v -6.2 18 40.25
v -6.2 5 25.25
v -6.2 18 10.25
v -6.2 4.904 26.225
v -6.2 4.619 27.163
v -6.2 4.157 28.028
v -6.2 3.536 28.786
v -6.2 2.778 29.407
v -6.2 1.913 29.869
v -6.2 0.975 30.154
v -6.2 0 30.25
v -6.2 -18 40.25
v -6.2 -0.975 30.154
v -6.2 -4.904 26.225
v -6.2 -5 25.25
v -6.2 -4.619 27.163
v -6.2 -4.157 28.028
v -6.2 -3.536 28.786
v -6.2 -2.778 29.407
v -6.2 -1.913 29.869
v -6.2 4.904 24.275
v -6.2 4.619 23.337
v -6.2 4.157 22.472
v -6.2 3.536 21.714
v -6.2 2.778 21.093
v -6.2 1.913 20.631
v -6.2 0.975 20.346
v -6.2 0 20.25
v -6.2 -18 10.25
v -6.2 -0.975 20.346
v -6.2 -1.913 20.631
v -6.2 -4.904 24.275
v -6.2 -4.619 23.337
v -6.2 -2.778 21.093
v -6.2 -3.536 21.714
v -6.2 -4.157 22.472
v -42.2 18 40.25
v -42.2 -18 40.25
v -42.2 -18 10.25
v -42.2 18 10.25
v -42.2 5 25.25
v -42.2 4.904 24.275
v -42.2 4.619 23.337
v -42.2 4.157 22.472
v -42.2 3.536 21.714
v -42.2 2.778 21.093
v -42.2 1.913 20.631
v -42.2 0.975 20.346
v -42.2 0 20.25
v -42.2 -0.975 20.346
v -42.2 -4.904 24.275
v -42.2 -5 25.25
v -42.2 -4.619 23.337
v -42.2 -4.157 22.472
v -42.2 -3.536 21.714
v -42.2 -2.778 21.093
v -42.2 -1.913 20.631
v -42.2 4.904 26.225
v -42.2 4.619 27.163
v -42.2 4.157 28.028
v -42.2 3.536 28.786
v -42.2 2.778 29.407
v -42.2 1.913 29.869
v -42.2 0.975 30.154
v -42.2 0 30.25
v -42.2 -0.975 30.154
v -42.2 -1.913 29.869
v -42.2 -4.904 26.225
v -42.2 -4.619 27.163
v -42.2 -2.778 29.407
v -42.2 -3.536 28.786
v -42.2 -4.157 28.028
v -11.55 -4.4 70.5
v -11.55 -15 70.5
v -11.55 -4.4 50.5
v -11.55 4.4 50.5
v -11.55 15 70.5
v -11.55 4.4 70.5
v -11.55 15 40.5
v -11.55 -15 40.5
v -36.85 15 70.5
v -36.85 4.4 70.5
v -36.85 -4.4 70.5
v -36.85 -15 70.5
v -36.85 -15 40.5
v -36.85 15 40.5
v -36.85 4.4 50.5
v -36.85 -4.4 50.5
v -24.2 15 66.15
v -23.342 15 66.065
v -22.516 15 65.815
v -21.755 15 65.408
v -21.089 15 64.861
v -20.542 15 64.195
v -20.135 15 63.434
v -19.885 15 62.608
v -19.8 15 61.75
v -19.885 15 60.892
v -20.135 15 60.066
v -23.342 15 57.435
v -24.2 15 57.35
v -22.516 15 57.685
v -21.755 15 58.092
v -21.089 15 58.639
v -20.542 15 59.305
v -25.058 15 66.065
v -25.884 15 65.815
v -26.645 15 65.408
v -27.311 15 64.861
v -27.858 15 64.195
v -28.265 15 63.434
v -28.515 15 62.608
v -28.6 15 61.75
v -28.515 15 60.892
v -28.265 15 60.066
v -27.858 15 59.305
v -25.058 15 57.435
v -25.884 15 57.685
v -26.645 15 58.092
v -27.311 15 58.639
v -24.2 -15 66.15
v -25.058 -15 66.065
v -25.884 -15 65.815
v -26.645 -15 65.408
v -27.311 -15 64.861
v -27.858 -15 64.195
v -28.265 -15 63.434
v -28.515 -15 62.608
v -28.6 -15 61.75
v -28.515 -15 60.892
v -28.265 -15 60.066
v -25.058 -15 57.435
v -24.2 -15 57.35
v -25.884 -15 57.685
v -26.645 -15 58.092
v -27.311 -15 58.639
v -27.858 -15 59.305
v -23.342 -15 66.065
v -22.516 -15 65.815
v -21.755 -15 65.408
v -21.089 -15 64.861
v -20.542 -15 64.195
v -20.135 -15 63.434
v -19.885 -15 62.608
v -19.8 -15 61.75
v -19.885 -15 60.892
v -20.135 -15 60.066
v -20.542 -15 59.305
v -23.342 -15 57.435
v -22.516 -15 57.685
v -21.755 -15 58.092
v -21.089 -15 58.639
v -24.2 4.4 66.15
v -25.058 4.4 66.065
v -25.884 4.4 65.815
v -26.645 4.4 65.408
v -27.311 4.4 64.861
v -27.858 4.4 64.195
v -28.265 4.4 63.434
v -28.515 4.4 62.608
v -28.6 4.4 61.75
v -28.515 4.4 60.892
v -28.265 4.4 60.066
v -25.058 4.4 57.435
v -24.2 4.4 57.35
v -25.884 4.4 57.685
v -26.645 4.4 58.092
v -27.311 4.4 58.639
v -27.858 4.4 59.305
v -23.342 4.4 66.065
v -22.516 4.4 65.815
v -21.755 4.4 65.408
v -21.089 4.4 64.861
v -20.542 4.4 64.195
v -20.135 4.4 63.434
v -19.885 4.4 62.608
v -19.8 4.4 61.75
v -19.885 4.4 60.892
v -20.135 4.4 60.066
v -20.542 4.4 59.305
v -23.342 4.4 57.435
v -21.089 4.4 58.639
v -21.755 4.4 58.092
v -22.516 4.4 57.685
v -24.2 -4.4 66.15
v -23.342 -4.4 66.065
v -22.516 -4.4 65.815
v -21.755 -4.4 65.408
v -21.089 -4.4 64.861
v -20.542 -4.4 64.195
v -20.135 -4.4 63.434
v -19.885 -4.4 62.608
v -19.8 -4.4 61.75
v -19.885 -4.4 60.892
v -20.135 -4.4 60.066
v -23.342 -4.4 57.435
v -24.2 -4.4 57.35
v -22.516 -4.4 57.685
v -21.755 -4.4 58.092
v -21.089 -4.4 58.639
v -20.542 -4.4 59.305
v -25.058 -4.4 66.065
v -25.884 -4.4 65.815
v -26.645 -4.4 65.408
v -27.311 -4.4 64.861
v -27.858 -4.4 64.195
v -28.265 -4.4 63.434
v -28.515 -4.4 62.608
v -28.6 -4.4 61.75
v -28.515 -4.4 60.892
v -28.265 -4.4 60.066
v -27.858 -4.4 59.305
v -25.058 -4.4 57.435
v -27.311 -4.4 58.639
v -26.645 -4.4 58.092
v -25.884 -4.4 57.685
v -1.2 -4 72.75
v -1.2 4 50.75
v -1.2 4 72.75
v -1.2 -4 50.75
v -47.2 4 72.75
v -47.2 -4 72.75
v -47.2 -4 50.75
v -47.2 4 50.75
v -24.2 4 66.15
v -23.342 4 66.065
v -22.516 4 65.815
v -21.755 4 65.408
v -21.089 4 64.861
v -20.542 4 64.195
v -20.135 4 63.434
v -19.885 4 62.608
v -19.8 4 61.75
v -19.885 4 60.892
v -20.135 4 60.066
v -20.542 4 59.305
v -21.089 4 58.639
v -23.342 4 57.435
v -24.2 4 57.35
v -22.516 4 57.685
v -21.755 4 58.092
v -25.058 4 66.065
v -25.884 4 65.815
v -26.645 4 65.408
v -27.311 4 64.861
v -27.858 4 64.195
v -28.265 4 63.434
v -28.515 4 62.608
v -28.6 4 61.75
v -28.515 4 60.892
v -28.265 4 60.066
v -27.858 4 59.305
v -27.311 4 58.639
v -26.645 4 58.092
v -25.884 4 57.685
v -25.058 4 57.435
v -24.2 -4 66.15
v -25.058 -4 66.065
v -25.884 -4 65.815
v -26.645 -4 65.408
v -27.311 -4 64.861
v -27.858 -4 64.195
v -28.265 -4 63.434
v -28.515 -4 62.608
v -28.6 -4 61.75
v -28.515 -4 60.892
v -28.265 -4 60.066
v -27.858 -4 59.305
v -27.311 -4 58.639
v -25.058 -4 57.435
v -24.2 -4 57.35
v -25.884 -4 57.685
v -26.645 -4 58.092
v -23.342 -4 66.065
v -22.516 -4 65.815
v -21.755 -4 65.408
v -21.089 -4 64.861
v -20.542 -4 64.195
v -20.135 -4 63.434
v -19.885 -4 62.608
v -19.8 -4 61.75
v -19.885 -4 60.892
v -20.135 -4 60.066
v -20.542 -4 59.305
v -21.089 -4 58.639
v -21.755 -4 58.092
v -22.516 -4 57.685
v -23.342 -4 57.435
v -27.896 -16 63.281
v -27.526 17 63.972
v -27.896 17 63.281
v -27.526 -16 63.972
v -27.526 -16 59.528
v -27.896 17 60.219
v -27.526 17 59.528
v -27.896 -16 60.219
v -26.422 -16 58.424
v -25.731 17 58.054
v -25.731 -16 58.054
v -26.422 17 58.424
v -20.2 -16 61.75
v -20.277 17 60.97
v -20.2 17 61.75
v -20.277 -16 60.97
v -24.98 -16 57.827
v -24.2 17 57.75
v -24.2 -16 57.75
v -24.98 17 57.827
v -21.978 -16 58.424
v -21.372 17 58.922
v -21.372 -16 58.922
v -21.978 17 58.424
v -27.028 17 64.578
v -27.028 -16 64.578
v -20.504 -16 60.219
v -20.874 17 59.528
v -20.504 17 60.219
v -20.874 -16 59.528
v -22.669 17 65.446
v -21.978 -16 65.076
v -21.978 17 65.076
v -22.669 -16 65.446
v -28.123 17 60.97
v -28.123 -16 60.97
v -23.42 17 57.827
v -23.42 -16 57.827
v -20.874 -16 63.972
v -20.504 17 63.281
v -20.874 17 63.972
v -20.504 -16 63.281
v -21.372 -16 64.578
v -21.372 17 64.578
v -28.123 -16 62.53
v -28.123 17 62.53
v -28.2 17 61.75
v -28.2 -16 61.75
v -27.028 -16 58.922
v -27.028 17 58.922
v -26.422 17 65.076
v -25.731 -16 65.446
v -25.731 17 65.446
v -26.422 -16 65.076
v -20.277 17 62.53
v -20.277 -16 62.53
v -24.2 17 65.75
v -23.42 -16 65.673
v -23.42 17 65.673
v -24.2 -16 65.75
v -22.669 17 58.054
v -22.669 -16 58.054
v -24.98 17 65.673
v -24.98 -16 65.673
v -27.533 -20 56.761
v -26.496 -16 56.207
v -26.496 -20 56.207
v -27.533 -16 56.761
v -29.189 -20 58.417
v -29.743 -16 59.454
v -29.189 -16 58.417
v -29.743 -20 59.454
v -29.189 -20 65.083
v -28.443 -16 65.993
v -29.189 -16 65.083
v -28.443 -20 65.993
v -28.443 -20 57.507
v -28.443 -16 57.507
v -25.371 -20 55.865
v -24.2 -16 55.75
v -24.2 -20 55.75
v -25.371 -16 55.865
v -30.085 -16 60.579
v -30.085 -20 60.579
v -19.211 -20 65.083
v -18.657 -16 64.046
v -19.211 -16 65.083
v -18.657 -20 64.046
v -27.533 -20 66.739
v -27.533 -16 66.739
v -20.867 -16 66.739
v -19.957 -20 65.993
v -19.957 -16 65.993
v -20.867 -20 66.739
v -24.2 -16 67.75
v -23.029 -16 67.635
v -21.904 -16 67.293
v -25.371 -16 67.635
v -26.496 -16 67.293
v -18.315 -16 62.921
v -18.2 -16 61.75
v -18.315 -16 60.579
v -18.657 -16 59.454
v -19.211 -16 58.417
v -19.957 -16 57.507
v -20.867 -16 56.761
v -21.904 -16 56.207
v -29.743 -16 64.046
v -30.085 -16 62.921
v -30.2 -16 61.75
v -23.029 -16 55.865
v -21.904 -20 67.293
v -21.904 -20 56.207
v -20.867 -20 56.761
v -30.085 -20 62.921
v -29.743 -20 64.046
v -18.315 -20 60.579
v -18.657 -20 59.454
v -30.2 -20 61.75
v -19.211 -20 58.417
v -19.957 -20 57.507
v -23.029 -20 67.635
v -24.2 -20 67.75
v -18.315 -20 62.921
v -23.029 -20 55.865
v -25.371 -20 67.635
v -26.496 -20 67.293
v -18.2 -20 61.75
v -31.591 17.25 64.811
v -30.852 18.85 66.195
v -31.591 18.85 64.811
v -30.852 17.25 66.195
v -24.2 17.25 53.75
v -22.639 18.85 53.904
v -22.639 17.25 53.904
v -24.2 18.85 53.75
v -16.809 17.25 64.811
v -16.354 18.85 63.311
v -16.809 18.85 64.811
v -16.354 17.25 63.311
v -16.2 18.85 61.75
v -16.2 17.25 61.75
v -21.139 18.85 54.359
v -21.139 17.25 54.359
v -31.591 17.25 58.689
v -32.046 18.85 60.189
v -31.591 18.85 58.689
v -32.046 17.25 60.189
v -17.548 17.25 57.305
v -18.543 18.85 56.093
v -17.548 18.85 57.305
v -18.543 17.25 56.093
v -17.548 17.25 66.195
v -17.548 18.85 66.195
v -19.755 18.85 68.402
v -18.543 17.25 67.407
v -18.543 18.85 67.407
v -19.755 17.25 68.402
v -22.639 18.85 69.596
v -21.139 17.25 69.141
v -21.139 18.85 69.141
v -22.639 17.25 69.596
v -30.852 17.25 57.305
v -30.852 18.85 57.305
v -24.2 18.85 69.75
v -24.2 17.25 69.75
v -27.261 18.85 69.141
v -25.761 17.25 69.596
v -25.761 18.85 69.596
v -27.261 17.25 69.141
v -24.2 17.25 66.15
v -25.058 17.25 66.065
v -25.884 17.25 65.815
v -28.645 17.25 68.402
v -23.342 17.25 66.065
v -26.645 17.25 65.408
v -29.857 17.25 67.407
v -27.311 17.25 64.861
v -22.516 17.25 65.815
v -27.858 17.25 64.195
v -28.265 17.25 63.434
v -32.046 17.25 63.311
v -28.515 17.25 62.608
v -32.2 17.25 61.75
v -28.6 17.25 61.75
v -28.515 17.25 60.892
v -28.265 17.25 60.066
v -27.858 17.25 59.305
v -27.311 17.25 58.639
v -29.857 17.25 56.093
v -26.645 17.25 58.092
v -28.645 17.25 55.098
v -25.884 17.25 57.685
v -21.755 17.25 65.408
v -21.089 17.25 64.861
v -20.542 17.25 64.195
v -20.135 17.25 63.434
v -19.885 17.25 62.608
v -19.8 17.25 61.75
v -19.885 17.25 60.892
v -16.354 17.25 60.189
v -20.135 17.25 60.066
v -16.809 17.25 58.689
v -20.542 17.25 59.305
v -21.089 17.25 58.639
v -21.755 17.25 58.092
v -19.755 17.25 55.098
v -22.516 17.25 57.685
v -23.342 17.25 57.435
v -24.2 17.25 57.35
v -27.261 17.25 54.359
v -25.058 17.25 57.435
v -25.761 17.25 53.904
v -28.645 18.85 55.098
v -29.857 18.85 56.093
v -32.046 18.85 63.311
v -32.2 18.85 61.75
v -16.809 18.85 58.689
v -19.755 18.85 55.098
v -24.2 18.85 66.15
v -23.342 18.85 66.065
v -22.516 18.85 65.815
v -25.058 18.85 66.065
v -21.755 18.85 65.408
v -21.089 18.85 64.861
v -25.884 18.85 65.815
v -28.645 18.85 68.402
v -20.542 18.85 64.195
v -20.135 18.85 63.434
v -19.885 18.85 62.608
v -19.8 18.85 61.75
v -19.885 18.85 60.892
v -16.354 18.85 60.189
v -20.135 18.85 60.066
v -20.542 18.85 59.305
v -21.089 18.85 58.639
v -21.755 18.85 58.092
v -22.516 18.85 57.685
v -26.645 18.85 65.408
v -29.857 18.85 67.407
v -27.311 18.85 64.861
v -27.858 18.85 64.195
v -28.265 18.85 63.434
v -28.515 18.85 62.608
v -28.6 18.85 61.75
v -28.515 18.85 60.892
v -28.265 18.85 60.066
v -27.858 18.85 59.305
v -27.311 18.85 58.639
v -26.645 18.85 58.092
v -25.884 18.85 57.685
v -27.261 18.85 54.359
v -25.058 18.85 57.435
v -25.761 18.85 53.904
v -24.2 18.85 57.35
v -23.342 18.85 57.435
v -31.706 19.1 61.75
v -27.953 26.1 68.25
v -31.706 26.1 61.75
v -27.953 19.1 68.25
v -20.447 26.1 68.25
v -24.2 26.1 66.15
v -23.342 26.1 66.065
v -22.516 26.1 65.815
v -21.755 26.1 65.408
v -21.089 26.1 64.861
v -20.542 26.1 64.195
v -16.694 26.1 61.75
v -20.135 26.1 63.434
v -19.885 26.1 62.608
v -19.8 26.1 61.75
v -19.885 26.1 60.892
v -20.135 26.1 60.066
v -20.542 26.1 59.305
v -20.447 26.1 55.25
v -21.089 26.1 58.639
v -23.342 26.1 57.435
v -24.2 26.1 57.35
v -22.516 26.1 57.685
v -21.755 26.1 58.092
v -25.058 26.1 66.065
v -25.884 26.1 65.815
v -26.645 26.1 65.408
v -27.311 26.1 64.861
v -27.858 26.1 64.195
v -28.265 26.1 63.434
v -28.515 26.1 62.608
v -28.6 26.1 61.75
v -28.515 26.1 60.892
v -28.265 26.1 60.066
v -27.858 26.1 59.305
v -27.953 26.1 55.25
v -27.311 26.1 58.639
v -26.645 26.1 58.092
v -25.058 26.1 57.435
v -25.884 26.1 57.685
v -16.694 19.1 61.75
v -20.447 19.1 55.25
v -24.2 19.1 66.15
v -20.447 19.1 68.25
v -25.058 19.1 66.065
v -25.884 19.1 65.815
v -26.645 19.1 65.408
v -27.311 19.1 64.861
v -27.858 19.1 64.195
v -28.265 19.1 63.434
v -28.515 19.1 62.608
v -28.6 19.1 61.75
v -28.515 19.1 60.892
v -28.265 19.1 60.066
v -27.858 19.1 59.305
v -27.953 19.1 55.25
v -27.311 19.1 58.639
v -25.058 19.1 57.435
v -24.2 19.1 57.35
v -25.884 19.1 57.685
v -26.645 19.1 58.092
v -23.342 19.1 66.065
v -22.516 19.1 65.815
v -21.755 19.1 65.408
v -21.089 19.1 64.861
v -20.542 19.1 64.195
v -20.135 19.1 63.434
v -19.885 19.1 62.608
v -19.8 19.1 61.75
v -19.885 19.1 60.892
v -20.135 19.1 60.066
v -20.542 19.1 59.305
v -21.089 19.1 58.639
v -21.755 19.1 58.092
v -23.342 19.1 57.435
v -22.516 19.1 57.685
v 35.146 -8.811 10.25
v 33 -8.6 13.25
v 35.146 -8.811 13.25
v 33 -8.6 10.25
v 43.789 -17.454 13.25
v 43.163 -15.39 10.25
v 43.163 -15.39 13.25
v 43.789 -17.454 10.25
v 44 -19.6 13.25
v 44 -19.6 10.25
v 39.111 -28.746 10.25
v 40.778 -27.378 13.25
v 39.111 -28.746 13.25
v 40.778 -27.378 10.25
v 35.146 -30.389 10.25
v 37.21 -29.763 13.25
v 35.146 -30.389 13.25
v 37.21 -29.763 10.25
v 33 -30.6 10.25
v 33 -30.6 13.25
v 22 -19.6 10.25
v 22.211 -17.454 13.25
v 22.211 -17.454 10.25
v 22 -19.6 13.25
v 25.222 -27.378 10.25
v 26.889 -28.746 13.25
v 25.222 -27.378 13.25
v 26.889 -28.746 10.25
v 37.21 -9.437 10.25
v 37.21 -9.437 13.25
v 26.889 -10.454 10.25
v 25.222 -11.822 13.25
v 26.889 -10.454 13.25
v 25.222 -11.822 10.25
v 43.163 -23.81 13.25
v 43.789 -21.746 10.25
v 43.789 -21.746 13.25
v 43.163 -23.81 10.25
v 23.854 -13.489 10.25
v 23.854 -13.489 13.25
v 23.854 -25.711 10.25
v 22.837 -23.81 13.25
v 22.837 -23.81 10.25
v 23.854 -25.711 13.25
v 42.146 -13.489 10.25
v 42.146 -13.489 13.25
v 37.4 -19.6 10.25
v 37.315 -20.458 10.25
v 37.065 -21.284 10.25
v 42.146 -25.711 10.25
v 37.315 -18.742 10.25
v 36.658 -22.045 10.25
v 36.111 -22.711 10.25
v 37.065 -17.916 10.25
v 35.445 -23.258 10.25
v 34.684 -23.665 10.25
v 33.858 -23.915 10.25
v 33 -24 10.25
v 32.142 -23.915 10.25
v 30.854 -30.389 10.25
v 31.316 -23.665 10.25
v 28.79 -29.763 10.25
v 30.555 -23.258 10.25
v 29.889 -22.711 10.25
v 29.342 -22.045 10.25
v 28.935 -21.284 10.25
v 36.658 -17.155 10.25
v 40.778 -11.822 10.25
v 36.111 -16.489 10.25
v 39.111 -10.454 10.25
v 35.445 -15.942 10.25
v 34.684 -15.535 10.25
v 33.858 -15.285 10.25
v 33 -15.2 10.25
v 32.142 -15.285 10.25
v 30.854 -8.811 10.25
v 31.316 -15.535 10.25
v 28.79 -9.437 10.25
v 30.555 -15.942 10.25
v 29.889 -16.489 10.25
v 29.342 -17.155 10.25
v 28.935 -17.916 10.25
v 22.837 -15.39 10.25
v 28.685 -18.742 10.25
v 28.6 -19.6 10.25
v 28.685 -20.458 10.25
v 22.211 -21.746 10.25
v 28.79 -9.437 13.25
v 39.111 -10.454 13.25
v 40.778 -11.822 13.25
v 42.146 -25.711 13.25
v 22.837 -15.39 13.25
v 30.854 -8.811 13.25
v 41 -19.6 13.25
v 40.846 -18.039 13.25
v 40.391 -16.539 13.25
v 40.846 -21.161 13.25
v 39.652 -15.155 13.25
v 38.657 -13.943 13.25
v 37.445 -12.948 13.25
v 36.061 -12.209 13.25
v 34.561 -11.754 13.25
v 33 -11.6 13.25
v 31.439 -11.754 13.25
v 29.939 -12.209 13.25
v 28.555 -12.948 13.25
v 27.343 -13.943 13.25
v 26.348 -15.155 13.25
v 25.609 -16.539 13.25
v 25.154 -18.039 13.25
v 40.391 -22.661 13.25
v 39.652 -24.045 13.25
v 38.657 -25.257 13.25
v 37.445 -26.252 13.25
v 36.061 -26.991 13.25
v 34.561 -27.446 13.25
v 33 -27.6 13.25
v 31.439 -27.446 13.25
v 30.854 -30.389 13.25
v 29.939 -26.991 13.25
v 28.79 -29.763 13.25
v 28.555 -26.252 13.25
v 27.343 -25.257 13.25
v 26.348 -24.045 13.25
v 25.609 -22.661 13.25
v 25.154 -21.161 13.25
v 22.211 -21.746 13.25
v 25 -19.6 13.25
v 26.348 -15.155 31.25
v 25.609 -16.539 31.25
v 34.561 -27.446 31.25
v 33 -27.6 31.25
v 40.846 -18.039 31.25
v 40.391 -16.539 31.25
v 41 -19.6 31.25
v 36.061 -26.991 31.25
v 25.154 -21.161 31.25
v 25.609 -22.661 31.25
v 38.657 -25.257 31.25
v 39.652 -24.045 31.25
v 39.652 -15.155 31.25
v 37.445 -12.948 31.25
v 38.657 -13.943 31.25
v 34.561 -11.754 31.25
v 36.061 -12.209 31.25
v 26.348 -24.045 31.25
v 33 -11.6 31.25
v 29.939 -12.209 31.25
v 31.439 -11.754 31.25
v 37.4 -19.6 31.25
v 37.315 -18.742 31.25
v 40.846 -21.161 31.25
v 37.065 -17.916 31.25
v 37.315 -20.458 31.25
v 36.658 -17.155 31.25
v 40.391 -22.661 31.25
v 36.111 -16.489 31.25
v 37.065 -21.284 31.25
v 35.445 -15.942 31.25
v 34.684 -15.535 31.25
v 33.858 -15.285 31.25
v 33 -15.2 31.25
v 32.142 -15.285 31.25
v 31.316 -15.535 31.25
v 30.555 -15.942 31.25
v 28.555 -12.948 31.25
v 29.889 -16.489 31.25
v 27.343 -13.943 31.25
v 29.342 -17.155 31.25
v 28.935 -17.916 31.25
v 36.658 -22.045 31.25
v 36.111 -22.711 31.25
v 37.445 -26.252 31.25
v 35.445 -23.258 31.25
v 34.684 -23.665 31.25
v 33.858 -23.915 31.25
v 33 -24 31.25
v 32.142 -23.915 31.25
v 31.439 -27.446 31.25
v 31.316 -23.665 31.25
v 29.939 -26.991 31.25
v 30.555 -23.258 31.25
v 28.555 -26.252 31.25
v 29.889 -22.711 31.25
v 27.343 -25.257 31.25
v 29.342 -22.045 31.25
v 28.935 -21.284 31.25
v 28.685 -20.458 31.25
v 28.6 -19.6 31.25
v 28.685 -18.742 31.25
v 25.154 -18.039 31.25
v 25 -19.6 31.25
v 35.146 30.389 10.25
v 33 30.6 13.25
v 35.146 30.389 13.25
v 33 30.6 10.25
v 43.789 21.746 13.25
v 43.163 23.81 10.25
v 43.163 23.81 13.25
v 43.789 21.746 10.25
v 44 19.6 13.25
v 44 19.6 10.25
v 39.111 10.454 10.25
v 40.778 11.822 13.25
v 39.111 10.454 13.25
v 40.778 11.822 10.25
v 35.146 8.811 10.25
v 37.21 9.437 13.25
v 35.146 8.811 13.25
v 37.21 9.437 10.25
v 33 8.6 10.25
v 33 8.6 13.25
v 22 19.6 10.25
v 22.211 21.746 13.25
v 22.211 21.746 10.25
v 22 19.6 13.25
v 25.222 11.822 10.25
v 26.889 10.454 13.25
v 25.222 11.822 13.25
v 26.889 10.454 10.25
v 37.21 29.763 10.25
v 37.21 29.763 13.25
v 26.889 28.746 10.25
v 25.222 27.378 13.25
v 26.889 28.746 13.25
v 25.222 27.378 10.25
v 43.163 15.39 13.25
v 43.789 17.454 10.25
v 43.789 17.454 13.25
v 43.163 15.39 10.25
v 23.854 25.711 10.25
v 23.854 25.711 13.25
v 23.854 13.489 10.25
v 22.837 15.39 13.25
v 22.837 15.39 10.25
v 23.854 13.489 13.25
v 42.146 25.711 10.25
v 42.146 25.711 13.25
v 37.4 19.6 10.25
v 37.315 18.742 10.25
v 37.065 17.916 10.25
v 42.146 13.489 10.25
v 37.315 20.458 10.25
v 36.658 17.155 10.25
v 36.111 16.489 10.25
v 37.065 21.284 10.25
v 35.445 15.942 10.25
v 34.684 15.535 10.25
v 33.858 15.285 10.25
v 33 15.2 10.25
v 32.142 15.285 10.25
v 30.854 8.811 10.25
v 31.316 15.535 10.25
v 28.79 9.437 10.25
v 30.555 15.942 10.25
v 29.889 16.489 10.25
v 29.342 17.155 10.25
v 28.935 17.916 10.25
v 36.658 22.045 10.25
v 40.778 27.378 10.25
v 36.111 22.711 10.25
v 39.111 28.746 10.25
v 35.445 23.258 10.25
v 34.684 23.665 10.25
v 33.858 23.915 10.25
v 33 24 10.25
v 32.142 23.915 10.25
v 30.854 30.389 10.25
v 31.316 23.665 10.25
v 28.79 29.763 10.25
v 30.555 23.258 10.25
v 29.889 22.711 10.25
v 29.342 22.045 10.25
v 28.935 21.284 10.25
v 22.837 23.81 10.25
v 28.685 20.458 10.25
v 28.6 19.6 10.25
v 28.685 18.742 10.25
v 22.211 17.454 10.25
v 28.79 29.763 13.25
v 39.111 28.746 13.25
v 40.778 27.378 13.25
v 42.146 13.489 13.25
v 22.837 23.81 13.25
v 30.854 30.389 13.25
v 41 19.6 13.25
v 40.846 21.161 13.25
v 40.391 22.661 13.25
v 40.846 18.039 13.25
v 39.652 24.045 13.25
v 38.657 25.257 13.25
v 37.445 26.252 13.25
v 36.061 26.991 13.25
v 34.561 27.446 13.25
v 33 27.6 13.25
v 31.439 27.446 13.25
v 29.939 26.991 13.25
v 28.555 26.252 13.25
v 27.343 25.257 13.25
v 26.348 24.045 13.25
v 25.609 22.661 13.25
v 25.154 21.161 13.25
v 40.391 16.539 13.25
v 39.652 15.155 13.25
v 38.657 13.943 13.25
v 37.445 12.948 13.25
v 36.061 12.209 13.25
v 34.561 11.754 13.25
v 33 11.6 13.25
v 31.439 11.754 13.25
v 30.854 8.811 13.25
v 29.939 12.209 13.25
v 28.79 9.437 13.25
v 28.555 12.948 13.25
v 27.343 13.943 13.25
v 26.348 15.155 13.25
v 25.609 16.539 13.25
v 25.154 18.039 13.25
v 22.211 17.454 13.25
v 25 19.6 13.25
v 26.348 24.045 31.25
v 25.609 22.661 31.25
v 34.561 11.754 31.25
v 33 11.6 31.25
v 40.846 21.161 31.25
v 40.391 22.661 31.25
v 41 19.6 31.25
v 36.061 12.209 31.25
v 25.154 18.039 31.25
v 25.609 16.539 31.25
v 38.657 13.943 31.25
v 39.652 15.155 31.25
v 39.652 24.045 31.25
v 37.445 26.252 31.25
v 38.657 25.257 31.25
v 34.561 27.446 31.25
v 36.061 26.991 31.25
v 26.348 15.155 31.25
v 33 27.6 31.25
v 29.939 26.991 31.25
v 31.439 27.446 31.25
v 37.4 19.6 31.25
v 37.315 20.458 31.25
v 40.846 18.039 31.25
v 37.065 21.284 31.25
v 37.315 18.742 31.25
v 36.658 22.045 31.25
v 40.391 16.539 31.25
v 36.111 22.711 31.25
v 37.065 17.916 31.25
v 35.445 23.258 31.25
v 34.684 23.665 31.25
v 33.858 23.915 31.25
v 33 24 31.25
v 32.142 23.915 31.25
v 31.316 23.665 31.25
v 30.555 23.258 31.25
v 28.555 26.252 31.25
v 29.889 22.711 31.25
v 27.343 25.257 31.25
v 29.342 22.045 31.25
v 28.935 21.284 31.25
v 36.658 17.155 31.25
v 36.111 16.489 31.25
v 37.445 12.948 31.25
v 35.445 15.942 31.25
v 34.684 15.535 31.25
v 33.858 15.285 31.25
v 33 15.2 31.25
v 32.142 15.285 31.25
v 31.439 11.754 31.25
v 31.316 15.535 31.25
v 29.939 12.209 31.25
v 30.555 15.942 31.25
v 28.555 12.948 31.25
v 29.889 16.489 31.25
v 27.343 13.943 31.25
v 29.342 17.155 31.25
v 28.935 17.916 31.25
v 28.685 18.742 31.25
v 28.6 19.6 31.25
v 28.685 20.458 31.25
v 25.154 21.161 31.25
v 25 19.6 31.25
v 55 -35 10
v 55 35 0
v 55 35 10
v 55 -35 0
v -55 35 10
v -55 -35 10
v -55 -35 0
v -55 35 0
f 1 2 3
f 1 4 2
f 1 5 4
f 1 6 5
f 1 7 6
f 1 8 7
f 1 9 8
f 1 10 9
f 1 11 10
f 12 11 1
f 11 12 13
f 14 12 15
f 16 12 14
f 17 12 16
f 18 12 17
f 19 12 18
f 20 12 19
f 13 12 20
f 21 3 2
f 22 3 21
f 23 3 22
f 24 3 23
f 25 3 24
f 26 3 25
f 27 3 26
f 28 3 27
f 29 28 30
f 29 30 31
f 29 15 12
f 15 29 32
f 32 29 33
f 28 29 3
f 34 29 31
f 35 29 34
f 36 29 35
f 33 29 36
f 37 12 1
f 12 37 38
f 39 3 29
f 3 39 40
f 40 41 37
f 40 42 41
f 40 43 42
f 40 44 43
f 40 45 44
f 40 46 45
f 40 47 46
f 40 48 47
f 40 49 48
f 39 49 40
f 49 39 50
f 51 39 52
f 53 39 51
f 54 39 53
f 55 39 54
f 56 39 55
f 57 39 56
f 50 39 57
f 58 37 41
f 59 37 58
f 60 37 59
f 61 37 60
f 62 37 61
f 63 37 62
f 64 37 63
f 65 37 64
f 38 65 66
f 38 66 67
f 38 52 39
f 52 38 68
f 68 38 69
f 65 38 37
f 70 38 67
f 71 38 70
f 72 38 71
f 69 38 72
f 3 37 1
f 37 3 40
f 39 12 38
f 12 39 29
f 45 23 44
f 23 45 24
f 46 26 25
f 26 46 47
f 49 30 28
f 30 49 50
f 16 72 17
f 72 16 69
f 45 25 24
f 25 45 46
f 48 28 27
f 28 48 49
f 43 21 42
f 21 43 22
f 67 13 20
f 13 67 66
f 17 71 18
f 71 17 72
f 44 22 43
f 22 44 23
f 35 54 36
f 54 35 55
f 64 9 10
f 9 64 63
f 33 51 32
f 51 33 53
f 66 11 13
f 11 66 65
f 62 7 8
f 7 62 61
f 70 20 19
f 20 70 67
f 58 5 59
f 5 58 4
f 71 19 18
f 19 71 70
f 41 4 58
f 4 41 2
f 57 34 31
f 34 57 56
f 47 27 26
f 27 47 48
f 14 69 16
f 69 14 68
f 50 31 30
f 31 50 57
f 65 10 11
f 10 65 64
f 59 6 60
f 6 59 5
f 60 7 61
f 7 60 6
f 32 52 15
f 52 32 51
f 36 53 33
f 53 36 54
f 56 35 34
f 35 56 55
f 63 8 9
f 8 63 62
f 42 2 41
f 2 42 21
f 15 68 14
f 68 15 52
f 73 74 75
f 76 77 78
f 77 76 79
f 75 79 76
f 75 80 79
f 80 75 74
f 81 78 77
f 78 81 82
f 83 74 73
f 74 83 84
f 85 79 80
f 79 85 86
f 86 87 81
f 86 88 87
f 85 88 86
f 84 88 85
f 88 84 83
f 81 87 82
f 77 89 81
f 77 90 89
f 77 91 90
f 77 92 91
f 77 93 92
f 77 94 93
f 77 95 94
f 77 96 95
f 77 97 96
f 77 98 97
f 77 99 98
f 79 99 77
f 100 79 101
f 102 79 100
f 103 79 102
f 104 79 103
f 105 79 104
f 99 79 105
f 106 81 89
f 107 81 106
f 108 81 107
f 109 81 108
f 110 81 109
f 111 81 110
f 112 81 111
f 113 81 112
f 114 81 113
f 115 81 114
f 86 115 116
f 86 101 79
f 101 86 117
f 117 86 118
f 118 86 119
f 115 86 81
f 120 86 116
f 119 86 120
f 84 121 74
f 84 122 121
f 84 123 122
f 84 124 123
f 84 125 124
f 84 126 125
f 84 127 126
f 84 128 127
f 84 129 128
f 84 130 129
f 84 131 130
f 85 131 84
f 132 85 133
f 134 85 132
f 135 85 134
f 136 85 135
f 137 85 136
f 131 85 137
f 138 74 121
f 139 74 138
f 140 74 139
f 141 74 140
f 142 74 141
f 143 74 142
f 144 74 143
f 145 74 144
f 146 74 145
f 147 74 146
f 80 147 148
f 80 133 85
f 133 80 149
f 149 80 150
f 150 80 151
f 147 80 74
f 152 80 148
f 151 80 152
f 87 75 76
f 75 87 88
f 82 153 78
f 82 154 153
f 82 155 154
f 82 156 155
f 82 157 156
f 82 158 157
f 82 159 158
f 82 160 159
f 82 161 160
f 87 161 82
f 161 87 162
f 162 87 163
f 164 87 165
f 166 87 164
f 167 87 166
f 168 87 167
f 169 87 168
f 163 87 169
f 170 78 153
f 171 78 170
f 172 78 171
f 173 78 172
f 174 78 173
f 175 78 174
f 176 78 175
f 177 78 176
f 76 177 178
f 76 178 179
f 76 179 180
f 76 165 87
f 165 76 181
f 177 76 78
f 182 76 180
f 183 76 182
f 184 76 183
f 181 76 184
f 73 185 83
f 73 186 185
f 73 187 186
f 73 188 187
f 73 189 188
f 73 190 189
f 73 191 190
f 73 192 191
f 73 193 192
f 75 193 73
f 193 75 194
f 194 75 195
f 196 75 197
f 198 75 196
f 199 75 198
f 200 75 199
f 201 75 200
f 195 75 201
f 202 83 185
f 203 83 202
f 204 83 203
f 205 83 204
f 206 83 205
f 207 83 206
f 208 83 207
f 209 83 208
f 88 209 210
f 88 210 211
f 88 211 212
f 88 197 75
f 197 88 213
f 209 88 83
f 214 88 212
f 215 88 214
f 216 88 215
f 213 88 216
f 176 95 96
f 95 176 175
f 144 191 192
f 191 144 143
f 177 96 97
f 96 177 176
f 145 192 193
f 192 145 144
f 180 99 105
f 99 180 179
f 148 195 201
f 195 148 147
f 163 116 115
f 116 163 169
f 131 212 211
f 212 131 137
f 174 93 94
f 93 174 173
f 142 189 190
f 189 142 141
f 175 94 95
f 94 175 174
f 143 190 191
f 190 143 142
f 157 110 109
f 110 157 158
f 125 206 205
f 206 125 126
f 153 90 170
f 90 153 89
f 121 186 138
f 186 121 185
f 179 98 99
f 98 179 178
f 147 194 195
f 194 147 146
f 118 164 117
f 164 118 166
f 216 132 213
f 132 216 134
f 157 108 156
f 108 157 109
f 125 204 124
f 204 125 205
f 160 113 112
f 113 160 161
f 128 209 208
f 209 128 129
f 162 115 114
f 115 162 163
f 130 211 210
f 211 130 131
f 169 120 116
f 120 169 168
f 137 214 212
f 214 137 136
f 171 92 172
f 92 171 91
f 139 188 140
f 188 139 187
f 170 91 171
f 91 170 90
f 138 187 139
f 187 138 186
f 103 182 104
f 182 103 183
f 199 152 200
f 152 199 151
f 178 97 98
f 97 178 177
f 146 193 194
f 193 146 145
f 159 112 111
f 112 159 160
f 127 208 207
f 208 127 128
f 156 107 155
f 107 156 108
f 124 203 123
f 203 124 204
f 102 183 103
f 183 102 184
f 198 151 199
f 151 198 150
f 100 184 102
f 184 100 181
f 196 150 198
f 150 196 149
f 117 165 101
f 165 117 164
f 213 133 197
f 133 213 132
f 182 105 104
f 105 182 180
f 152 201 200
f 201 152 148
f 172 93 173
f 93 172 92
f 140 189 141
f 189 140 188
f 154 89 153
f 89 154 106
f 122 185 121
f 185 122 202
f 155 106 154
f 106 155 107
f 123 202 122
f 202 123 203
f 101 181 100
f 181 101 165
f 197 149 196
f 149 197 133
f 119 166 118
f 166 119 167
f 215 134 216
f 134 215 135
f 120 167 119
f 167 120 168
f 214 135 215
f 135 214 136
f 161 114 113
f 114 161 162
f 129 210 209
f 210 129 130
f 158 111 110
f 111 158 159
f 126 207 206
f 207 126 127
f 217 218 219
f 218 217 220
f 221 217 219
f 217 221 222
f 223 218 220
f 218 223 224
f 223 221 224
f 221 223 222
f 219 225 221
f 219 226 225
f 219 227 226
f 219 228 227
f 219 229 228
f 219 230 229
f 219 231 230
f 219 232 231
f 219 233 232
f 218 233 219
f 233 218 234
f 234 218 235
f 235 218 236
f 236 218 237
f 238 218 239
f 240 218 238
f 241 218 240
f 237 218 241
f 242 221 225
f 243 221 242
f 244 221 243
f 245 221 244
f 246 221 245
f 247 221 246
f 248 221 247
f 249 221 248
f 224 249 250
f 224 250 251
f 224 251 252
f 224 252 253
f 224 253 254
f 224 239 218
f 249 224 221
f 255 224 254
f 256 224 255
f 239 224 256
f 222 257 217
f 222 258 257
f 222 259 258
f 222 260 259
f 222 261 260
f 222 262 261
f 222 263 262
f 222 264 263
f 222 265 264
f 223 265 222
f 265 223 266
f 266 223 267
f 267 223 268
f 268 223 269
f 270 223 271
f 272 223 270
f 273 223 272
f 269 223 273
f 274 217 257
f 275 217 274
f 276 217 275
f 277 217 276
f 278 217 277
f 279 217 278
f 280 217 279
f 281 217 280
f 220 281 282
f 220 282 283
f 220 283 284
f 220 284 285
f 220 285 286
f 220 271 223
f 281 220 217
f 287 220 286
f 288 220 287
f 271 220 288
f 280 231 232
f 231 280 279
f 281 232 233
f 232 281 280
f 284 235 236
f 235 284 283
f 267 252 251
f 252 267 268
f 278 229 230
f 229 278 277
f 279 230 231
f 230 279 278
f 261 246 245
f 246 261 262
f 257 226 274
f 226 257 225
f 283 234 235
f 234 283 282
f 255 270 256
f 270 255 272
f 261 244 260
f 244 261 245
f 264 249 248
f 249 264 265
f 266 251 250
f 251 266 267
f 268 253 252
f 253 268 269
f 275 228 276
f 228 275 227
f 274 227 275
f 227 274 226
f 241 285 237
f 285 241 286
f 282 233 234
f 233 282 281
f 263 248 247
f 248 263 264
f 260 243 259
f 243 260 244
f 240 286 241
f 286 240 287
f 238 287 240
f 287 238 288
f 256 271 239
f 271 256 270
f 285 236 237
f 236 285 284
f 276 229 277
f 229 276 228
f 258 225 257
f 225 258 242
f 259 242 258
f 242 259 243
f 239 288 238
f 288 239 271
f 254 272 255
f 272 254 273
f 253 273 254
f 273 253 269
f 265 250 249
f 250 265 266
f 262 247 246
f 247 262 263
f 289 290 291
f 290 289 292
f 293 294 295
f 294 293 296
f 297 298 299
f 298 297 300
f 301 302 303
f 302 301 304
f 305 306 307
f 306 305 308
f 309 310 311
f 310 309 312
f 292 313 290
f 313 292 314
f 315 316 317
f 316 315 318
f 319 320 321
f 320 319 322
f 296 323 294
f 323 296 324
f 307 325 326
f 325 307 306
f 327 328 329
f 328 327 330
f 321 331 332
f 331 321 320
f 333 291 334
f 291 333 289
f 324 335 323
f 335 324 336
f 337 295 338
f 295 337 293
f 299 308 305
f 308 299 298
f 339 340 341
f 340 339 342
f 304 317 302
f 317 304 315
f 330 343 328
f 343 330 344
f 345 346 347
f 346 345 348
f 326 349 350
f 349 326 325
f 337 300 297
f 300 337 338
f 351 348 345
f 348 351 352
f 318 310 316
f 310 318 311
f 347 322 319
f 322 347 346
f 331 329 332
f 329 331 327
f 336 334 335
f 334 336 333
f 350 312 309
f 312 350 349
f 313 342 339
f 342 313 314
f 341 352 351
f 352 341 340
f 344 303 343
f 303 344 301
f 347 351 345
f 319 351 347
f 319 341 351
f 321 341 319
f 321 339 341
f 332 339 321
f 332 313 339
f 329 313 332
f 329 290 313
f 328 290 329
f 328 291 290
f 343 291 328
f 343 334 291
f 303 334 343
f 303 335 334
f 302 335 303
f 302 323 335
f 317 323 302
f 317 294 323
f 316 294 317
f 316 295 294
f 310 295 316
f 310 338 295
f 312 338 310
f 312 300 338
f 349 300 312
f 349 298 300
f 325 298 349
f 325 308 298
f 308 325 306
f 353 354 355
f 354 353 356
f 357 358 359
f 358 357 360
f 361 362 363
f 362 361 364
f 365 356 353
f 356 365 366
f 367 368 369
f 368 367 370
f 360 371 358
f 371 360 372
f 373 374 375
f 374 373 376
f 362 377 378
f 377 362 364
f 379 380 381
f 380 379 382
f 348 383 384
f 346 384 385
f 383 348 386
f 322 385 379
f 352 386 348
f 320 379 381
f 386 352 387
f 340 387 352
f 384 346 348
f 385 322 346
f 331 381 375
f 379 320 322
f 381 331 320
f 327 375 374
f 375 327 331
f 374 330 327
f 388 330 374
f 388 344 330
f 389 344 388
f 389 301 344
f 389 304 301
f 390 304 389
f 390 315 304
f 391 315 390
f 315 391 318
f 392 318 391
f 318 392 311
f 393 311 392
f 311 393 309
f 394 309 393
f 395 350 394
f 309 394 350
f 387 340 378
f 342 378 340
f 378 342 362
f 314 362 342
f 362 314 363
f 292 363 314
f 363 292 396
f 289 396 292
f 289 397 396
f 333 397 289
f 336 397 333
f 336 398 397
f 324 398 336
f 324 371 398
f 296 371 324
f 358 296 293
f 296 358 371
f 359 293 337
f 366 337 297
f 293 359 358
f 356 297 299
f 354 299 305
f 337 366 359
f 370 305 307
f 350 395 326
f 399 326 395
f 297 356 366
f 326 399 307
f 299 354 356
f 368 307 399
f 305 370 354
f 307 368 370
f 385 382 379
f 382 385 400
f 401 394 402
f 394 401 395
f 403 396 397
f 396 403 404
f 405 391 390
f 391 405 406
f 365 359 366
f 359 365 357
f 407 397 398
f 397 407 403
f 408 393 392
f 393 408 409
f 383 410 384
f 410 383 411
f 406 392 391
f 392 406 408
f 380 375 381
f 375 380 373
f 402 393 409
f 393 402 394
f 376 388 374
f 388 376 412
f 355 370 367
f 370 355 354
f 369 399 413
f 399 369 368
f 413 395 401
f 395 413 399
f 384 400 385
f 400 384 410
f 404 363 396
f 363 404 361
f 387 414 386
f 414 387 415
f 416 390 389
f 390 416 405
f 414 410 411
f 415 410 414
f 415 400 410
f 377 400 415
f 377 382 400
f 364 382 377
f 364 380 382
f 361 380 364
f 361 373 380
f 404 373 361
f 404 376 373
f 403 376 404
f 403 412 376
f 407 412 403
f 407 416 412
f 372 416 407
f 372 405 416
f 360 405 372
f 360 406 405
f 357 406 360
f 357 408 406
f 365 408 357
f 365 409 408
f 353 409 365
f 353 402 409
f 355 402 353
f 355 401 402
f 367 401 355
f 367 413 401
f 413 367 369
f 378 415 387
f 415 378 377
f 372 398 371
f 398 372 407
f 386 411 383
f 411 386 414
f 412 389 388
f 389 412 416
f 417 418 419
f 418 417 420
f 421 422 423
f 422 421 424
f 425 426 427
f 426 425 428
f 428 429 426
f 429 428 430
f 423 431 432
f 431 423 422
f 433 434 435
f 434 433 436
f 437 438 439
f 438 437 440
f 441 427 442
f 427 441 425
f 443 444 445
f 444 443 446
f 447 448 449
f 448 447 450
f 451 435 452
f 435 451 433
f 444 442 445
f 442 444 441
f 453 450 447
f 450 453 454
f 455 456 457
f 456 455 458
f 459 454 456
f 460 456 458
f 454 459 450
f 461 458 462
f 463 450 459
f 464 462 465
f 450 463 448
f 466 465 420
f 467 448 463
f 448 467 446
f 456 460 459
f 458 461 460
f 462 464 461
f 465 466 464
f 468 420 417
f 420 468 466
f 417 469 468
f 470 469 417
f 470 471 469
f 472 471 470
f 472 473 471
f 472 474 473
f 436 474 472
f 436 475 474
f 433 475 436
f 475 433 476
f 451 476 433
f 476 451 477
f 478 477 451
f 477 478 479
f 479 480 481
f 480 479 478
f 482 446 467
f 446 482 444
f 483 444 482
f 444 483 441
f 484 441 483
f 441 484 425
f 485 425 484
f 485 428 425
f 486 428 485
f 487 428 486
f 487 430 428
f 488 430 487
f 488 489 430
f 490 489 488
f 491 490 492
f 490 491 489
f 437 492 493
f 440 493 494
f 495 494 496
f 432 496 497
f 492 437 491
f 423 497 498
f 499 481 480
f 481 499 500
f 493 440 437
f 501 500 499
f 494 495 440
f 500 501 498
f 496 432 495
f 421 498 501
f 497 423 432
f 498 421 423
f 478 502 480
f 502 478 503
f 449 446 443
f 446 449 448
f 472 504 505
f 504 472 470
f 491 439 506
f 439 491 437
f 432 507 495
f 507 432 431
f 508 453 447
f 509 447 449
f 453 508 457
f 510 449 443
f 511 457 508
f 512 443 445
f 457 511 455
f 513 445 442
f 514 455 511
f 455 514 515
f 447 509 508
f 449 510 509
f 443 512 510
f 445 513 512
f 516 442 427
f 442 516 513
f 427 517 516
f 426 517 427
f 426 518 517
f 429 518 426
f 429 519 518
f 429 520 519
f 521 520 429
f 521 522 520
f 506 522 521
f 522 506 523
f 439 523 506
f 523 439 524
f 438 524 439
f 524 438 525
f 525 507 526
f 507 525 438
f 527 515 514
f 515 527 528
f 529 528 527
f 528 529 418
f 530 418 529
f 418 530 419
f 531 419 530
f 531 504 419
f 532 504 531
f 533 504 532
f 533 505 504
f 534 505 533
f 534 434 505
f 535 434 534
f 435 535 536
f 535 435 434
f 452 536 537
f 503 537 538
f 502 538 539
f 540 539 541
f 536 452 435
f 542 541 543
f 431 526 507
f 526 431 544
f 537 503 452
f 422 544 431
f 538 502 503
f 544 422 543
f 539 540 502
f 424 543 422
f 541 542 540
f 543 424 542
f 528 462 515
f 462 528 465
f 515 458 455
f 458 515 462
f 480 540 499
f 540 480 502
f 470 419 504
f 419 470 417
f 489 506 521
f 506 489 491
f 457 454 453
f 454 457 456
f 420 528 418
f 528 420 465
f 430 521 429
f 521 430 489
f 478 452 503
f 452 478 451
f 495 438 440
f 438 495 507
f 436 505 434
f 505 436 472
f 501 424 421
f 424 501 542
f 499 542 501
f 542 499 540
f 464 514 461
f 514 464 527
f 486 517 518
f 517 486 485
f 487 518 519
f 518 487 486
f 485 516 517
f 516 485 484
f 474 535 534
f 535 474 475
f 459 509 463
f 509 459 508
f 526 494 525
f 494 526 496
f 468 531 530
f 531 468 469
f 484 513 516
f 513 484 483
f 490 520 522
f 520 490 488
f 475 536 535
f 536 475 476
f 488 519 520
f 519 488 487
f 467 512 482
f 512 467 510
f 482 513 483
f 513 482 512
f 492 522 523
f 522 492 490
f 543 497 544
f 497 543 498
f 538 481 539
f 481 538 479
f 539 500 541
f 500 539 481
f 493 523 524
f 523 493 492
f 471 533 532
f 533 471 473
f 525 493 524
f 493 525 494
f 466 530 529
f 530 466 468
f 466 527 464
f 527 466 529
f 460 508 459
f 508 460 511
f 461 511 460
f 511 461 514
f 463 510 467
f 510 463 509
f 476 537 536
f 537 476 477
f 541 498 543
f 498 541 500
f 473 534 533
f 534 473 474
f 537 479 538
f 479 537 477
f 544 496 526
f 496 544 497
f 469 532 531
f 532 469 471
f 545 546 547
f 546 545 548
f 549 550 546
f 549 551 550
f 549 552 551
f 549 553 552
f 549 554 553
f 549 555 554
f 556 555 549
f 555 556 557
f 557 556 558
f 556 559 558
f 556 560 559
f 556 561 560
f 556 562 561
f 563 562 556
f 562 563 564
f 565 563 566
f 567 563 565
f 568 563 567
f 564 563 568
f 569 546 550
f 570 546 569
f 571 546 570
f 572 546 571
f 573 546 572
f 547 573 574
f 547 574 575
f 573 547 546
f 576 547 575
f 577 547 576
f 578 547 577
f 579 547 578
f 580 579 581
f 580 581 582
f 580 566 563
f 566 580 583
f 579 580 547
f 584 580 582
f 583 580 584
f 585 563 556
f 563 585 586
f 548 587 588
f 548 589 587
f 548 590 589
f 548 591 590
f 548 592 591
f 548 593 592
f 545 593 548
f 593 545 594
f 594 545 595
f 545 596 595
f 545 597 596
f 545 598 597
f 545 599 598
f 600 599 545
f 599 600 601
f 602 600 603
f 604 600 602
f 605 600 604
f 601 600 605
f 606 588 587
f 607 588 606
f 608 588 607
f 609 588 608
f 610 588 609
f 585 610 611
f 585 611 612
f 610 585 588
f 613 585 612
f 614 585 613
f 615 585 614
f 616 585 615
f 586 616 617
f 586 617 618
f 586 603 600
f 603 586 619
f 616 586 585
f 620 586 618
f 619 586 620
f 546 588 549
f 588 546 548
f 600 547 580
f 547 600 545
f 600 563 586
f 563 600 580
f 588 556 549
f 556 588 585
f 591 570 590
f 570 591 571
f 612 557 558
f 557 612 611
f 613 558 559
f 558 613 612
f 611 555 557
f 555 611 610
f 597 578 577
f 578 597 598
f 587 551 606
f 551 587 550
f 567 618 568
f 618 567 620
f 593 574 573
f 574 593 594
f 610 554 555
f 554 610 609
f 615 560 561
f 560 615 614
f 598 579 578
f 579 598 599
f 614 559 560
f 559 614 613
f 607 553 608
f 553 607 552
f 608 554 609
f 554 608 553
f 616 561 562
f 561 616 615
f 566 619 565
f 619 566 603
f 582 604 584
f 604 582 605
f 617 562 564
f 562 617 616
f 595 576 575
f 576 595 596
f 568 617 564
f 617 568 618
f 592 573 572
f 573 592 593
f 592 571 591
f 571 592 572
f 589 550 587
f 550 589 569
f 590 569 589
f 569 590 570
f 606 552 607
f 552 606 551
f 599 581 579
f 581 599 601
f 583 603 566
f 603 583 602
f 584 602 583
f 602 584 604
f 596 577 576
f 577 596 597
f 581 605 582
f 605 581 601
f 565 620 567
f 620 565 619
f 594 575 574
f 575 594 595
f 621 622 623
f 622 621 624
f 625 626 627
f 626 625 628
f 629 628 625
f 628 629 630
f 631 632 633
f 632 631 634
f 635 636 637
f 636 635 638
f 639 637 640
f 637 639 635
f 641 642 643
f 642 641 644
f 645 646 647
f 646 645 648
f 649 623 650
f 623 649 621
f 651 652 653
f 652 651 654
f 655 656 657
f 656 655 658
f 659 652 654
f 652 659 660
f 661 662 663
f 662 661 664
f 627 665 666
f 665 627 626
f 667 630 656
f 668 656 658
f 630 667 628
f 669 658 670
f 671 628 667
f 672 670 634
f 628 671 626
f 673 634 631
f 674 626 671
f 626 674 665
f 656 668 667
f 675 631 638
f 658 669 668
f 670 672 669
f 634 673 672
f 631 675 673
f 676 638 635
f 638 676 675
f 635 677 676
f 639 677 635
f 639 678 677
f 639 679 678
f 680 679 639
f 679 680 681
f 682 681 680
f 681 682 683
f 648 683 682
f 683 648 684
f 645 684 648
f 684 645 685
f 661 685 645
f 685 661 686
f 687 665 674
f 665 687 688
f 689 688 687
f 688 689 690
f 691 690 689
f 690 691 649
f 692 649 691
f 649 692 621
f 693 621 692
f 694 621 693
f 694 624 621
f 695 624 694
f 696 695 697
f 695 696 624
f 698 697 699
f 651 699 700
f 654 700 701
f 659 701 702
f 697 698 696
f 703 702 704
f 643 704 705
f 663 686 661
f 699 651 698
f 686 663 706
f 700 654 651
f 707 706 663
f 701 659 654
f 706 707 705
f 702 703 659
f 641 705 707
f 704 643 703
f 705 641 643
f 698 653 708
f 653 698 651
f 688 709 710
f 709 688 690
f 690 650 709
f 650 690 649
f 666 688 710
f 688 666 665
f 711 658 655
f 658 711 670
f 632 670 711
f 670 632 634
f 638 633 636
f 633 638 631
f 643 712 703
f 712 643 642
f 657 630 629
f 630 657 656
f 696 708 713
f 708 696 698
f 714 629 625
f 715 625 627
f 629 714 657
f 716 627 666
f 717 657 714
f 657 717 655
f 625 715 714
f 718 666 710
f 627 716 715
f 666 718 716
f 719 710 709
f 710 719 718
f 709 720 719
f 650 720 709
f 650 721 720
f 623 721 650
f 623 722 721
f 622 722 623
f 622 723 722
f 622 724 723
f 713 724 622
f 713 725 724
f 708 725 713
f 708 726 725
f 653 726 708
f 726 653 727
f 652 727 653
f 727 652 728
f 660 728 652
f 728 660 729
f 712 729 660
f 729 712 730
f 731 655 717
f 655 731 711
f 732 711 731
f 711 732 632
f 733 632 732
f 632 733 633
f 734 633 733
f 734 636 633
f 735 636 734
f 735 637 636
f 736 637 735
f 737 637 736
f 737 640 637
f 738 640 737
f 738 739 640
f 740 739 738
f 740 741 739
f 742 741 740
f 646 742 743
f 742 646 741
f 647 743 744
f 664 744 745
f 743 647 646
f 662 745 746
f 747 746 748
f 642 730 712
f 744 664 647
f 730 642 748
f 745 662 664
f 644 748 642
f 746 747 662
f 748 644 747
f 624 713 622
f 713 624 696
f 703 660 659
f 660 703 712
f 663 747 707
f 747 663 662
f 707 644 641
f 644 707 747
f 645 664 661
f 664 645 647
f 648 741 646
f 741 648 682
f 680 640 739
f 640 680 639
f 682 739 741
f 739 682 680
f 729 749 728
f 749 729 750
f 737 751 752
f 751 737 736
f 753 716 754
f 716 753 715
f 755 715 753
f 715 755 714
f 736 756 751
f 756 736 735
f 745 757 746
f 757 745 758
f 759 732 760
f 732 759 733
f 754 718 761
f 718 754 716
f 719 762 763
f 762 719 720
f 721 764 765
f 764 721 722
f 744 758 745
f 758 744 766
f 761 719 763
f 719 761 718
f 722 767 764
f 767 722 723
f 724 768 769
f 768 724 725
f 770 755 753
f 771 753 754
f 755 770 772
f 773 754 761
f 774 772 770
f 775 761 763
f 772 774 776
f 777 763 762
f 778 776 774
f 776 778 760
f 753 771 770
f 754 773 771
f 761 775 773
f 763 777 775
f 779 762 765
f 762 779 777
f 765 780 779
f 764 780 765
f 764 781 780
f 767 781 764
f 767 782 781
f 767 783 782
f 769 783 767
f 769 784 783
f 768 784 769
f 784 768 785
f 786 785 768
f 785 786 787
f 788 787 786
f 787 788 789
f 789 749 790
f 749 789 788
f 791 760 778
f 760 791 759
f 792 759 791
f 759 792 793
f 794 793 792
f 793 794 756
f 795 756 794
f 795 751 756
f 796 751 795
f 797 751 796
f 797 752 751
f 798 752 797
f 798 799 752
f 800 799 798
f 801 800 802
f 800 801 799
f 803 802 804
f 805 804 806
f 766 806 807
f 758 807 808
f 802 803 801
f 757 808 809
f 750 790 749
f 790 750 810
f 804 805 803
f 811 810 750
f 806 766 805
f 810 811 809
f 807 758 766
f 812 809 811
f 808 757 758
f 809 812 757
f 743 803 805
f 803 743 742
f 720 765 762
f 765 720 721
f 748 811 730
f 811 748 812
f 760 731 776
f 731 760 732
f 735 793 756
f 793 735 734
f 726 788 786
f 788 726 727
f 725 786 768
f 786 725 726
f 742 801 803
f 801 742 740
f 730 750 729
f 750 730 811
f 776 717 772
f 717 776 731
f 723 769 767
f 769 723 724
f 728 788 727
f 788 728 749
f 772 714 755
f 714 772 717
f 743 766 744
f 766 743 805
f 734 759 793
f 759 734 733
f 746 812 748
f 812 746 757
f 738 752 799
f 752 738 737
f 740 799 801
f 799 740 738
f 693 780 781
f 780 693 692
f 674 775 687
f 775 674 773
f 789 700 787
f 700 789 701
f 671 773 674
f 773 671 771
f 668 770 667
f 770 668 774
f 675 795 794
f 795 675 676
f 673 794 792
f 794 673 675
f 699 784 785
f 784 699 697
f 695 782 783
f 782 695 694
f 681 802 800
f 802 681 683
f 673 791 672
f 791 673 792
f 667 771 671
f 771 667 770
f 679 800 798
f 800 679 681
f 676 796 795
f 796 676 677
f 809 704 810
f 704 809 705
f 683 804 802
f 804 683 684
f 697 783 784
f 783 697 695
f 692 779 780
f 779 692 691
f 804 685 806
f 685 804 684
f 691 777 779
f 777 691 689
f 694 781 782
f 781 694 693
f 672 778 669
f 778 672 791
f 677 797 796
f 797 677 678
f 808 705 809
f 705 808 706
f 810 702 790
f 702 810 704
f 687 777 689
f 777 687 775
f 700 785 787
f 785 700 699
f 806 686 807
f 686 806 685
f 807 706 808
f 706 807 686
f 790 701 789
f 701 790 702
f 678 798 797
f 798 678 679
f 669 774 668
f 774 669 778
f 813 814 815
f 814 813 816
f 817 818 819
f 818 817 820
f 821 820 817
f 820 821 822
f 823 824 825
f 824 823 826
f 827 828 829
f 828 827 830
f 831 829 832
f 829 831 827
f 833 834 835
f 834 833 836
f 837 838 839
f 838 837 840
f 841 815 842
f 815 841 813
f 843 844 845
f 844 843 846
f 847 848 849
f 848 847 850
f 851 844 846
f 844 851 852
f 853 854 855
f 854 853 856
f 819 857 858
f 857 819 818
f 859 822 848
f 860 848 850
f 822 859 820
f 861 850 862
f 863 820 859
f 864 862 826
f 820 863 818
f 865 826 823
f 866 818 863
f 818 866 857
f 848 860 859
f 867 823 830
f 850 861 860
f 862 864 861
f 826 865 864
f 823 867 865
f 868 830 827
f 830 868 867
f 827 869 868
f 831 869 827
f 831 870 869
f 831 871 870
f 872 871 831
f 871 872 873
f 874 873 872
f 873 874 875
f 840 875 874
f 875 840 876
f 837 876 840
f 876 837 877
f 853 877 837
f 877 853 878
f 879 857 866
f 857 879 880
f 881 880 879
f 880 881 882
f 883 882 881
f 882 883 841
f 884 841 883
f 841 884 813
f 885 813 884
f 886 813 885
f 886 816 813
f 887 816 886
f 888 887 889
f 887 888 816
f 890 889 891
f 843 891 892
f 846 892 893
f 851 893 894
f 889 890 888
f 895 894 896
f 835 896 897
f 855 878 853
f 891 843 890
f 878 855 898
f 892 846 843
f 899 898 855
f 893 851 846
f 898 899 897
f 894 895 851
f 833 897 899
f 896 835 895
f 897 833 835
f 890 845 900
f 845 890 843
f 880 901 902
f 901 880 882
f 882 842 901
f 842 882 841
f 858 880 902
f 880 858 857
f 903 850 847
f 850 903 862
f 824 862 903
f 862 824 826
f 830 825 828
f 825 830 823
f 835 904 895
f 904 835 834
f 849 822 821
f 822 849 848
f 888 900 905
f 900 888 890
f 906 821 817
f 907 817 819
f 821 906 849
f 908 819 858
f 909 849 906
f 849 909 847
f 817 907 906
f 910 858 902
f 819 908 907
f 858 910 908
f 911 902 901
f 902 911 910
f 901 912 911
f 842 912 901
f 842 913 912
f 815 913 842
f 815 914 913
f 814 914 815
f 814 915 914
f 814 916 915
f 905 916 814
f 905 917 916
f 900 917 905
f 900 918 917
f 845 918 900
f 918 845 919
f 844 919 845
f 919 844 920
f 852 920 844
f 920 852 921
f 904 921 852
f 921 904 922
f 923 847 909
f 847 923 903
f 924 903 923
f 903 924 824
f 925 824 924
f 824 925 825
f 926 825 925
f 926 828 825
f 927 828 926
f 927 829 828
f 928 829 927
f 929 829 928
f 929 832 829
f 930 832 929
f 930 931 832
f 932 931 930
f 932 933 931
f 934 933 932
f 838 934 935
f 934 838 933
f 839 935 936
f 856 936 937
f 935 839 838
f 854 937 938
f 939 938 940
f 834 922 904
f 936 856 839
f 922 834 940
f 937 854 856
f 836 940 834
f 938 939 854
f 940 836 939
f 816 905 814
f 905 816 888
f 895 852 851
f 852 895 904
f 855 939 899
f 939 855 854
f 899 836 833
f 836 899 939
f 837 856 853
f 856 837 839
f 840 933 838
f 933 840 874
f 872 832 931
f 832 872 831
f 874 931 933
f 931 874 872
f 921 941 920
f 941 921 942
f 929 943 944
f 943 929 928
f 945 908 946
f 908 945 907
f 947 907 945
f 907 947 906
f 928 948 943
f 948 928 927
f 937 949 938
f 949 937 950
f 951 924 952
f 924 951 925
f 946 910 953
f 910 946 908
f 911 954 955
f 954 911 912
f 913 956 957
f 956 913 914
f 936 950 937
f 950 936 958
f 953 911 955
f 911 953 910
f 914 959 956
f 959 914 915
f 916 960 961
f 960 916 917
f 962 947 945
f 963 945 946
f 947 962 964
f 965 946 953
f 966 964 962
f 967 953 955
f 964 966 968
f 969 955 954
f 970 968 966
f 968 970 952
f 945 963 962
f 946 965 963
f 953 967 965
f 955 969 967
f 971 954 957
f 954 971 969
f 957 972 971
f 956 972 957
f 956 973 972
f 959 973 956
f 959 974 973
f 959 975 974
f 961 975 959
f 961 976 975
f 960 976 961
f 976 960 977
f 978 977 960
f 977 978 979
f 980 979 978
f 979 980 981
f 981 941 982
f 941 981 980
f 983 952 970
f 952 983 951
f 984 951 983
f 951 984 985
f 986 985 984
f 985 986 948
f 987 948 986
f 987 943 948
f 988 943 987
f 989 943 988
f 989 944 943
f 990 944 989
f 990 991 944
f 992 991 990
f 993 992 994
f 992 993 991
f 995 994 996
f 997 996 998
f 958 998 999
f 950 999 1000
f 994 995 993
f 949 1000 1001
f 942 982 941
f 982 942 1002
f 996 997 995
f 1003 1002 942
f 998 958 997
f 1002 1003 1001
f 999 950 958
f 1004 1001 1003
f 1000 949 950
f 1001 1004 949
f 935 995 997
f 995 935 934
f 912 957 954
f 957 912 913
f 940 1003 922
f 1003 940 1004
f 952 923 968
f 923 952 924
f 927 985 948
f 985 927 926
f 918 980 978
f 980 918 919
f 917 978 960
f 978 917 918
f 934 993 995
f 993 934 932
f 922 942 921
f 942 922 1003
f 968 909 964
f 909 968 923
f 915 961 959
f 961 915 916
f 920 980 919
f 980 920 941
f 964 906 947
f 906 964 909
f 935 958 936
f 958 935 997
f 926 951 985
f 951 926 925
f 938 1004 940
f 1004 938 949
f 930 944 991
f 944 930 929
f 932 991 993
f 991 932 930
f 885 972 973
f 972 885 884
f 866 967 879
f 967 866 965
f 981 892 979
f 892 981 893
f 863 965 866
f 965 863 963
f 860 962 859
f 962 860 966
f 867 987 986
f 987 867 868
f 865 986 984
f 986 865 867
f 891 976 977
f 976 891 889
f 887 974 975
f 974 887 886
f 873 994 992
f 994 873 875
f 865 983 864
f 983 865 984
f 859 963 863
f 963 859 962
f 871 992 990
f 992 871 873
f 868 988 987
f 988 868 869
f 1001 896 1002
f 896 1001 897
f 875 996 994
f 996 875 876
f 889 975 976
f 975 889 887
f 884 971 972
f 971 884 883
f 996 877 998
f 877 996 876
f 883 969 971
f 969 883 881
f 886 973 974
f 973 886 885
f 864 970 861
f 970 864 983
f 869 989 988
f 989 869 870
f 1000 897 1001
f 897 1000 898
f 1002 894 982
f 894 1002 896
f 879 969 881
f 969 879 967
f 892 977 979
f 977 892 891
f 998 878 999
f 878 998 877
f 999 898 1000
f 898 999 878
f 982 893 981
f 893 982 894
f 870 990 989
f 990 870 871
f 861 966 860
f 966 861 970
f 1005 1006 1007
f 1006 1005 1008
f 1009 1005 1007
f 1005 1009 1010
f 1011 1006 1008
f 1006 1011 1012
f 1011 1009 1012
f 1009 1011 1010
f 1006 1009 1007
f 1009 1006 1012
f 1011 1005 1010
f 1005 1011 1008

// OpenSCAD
$fn = 32;

// ------------------------------------------------------------------------
// Indexing jig: plate 110 x 70 mm, pin d8
// Every part is its own module, assembly() places every instance.
// ------------------------------------------------------------------------

// --- part 1 ---
module jig_plate() {
  difference() {
    translate([-55, -35, 0]) cube([110, 70, 10]);
  }
}

// --- part 2 ---
module locator_block() {
  difference() {
    translate([-18, -18, 0]) cube([36, 36, 30]);
    translate([0, 0, 15]) rotate([0, 90, 0]) cylinder(h = 38, d = 10, center = true);
  }
}

// --- part 3 ---
module index_fork() {
  difference() {
    translate([-12.65, -15, 0]) cube([25.3, 30, 30]);
    translate([-13.65, -4.4, 10]) cube([27.3, 8.8, 21]);
    translate([0, 0, 21.25]) rotate([90, 0, 0]) cylinder(h = 32, d = 8.8, center = true);
  }
}

// --- part 4 ---
module index_arm() {
  difference() {
    translate([-23, -4, 0]) cube([46, 8, 22]);
    translate([0, 0, 11]) rotate([90, 0, 0]) cylinder(h = 10, d = 8.8, center = true);
  }
}

// --- part 5 ---
module index_pin() {
  rotate([0, 90, 0]) cylinder(h = 34, d = 8, center = true);
  translate([-20, 0, 0]) rotate([0, 90, 0]) cylinder(h = 4, d = 12);
}

// --- part 6 ---
module pin_washer() {
  difference() {
      translate([0, 0, 0]) cylinder(h = 1.6, d = 16);
      translate([0, 0, -1]) cylinder(h = 3.6, d = 8.8);
    }
}

// --- part 7 ---
module lock_nut() {
  difference() {
    linear_extrude(height = 7) polygon(points = [[7.506, 0], [3.753, 6.5], [-3.753, 6.5], [-7.506, 0], [-3.753, -6.5], [3.753, -6.5]]);
    translate([0, 0, -1]) cylinder(h = 9, d = 8.8);
  }
}

// --- part 8 ---
module guide_bush_a() {
  difference() {
    union() {
      cylinder(h = 3, d = 22);
      translate([0, 0, 3]) cylinder(h = 18, d = 16);
    }
    translate([0, 0, -1]) cylinder(h = 23, d = 8.8);
  }
}

// --- part 9 ---
module guide_bush_b() {
  difference() {
    union() {
      cylinder(h = 3, d = 22);
      translate([0, 0, 3]) cylinder(h = 18, d = 16);
    }
    translate([0, 0, -1]) cylinder(h = 23, d = 8.8);
  }
}

// --- assembly ---
module assembly() {
  color([0.80, 0.24, 0.20]) translate([0, 0, 0]) rotate([0, 0, 0]) jig_plate();
  color([0.20, 0.45, 0.75]) translate([-24.2, 0, 10.25]) rotate([0, 0, 0]) locator_block();
  color([0.25, 0.62, 0.32]) translate([-24.2, 0, 40.5]) rotate([0, 0, 0]) index_fork();
  color([0.92, 0.70, 0.18]) translate([-24.2, 0, 50.75]) rotate([0, 0, 0]) index_arm();
  color([0.58, 0.35, 0.70]) translate([-24.2, 0, 61.75]) rotate([0, 0, 90]) index_pin();
  color([0.16, 0.66, 0.66]) translate([-24.2, 18.85, 61.75]) rotate([90, 0, 0]) pin_washer();
  color([0.85, 0.48, 0.18]) translate([-24.2, 26.1, 61.75]) rotate([90, 0, 0]) lock_nut();
  color([0.55, 0.60, 0.65]) translate([33, -19.6, 10.25]) rotate([0, 0, 0]) guide_bush_a();
  color([0.75, 0.30, 0.55]) translate([33, 19.6, 10.25]) rotate([0, 0, 0]) guide_bush_b();
}

assembly();
